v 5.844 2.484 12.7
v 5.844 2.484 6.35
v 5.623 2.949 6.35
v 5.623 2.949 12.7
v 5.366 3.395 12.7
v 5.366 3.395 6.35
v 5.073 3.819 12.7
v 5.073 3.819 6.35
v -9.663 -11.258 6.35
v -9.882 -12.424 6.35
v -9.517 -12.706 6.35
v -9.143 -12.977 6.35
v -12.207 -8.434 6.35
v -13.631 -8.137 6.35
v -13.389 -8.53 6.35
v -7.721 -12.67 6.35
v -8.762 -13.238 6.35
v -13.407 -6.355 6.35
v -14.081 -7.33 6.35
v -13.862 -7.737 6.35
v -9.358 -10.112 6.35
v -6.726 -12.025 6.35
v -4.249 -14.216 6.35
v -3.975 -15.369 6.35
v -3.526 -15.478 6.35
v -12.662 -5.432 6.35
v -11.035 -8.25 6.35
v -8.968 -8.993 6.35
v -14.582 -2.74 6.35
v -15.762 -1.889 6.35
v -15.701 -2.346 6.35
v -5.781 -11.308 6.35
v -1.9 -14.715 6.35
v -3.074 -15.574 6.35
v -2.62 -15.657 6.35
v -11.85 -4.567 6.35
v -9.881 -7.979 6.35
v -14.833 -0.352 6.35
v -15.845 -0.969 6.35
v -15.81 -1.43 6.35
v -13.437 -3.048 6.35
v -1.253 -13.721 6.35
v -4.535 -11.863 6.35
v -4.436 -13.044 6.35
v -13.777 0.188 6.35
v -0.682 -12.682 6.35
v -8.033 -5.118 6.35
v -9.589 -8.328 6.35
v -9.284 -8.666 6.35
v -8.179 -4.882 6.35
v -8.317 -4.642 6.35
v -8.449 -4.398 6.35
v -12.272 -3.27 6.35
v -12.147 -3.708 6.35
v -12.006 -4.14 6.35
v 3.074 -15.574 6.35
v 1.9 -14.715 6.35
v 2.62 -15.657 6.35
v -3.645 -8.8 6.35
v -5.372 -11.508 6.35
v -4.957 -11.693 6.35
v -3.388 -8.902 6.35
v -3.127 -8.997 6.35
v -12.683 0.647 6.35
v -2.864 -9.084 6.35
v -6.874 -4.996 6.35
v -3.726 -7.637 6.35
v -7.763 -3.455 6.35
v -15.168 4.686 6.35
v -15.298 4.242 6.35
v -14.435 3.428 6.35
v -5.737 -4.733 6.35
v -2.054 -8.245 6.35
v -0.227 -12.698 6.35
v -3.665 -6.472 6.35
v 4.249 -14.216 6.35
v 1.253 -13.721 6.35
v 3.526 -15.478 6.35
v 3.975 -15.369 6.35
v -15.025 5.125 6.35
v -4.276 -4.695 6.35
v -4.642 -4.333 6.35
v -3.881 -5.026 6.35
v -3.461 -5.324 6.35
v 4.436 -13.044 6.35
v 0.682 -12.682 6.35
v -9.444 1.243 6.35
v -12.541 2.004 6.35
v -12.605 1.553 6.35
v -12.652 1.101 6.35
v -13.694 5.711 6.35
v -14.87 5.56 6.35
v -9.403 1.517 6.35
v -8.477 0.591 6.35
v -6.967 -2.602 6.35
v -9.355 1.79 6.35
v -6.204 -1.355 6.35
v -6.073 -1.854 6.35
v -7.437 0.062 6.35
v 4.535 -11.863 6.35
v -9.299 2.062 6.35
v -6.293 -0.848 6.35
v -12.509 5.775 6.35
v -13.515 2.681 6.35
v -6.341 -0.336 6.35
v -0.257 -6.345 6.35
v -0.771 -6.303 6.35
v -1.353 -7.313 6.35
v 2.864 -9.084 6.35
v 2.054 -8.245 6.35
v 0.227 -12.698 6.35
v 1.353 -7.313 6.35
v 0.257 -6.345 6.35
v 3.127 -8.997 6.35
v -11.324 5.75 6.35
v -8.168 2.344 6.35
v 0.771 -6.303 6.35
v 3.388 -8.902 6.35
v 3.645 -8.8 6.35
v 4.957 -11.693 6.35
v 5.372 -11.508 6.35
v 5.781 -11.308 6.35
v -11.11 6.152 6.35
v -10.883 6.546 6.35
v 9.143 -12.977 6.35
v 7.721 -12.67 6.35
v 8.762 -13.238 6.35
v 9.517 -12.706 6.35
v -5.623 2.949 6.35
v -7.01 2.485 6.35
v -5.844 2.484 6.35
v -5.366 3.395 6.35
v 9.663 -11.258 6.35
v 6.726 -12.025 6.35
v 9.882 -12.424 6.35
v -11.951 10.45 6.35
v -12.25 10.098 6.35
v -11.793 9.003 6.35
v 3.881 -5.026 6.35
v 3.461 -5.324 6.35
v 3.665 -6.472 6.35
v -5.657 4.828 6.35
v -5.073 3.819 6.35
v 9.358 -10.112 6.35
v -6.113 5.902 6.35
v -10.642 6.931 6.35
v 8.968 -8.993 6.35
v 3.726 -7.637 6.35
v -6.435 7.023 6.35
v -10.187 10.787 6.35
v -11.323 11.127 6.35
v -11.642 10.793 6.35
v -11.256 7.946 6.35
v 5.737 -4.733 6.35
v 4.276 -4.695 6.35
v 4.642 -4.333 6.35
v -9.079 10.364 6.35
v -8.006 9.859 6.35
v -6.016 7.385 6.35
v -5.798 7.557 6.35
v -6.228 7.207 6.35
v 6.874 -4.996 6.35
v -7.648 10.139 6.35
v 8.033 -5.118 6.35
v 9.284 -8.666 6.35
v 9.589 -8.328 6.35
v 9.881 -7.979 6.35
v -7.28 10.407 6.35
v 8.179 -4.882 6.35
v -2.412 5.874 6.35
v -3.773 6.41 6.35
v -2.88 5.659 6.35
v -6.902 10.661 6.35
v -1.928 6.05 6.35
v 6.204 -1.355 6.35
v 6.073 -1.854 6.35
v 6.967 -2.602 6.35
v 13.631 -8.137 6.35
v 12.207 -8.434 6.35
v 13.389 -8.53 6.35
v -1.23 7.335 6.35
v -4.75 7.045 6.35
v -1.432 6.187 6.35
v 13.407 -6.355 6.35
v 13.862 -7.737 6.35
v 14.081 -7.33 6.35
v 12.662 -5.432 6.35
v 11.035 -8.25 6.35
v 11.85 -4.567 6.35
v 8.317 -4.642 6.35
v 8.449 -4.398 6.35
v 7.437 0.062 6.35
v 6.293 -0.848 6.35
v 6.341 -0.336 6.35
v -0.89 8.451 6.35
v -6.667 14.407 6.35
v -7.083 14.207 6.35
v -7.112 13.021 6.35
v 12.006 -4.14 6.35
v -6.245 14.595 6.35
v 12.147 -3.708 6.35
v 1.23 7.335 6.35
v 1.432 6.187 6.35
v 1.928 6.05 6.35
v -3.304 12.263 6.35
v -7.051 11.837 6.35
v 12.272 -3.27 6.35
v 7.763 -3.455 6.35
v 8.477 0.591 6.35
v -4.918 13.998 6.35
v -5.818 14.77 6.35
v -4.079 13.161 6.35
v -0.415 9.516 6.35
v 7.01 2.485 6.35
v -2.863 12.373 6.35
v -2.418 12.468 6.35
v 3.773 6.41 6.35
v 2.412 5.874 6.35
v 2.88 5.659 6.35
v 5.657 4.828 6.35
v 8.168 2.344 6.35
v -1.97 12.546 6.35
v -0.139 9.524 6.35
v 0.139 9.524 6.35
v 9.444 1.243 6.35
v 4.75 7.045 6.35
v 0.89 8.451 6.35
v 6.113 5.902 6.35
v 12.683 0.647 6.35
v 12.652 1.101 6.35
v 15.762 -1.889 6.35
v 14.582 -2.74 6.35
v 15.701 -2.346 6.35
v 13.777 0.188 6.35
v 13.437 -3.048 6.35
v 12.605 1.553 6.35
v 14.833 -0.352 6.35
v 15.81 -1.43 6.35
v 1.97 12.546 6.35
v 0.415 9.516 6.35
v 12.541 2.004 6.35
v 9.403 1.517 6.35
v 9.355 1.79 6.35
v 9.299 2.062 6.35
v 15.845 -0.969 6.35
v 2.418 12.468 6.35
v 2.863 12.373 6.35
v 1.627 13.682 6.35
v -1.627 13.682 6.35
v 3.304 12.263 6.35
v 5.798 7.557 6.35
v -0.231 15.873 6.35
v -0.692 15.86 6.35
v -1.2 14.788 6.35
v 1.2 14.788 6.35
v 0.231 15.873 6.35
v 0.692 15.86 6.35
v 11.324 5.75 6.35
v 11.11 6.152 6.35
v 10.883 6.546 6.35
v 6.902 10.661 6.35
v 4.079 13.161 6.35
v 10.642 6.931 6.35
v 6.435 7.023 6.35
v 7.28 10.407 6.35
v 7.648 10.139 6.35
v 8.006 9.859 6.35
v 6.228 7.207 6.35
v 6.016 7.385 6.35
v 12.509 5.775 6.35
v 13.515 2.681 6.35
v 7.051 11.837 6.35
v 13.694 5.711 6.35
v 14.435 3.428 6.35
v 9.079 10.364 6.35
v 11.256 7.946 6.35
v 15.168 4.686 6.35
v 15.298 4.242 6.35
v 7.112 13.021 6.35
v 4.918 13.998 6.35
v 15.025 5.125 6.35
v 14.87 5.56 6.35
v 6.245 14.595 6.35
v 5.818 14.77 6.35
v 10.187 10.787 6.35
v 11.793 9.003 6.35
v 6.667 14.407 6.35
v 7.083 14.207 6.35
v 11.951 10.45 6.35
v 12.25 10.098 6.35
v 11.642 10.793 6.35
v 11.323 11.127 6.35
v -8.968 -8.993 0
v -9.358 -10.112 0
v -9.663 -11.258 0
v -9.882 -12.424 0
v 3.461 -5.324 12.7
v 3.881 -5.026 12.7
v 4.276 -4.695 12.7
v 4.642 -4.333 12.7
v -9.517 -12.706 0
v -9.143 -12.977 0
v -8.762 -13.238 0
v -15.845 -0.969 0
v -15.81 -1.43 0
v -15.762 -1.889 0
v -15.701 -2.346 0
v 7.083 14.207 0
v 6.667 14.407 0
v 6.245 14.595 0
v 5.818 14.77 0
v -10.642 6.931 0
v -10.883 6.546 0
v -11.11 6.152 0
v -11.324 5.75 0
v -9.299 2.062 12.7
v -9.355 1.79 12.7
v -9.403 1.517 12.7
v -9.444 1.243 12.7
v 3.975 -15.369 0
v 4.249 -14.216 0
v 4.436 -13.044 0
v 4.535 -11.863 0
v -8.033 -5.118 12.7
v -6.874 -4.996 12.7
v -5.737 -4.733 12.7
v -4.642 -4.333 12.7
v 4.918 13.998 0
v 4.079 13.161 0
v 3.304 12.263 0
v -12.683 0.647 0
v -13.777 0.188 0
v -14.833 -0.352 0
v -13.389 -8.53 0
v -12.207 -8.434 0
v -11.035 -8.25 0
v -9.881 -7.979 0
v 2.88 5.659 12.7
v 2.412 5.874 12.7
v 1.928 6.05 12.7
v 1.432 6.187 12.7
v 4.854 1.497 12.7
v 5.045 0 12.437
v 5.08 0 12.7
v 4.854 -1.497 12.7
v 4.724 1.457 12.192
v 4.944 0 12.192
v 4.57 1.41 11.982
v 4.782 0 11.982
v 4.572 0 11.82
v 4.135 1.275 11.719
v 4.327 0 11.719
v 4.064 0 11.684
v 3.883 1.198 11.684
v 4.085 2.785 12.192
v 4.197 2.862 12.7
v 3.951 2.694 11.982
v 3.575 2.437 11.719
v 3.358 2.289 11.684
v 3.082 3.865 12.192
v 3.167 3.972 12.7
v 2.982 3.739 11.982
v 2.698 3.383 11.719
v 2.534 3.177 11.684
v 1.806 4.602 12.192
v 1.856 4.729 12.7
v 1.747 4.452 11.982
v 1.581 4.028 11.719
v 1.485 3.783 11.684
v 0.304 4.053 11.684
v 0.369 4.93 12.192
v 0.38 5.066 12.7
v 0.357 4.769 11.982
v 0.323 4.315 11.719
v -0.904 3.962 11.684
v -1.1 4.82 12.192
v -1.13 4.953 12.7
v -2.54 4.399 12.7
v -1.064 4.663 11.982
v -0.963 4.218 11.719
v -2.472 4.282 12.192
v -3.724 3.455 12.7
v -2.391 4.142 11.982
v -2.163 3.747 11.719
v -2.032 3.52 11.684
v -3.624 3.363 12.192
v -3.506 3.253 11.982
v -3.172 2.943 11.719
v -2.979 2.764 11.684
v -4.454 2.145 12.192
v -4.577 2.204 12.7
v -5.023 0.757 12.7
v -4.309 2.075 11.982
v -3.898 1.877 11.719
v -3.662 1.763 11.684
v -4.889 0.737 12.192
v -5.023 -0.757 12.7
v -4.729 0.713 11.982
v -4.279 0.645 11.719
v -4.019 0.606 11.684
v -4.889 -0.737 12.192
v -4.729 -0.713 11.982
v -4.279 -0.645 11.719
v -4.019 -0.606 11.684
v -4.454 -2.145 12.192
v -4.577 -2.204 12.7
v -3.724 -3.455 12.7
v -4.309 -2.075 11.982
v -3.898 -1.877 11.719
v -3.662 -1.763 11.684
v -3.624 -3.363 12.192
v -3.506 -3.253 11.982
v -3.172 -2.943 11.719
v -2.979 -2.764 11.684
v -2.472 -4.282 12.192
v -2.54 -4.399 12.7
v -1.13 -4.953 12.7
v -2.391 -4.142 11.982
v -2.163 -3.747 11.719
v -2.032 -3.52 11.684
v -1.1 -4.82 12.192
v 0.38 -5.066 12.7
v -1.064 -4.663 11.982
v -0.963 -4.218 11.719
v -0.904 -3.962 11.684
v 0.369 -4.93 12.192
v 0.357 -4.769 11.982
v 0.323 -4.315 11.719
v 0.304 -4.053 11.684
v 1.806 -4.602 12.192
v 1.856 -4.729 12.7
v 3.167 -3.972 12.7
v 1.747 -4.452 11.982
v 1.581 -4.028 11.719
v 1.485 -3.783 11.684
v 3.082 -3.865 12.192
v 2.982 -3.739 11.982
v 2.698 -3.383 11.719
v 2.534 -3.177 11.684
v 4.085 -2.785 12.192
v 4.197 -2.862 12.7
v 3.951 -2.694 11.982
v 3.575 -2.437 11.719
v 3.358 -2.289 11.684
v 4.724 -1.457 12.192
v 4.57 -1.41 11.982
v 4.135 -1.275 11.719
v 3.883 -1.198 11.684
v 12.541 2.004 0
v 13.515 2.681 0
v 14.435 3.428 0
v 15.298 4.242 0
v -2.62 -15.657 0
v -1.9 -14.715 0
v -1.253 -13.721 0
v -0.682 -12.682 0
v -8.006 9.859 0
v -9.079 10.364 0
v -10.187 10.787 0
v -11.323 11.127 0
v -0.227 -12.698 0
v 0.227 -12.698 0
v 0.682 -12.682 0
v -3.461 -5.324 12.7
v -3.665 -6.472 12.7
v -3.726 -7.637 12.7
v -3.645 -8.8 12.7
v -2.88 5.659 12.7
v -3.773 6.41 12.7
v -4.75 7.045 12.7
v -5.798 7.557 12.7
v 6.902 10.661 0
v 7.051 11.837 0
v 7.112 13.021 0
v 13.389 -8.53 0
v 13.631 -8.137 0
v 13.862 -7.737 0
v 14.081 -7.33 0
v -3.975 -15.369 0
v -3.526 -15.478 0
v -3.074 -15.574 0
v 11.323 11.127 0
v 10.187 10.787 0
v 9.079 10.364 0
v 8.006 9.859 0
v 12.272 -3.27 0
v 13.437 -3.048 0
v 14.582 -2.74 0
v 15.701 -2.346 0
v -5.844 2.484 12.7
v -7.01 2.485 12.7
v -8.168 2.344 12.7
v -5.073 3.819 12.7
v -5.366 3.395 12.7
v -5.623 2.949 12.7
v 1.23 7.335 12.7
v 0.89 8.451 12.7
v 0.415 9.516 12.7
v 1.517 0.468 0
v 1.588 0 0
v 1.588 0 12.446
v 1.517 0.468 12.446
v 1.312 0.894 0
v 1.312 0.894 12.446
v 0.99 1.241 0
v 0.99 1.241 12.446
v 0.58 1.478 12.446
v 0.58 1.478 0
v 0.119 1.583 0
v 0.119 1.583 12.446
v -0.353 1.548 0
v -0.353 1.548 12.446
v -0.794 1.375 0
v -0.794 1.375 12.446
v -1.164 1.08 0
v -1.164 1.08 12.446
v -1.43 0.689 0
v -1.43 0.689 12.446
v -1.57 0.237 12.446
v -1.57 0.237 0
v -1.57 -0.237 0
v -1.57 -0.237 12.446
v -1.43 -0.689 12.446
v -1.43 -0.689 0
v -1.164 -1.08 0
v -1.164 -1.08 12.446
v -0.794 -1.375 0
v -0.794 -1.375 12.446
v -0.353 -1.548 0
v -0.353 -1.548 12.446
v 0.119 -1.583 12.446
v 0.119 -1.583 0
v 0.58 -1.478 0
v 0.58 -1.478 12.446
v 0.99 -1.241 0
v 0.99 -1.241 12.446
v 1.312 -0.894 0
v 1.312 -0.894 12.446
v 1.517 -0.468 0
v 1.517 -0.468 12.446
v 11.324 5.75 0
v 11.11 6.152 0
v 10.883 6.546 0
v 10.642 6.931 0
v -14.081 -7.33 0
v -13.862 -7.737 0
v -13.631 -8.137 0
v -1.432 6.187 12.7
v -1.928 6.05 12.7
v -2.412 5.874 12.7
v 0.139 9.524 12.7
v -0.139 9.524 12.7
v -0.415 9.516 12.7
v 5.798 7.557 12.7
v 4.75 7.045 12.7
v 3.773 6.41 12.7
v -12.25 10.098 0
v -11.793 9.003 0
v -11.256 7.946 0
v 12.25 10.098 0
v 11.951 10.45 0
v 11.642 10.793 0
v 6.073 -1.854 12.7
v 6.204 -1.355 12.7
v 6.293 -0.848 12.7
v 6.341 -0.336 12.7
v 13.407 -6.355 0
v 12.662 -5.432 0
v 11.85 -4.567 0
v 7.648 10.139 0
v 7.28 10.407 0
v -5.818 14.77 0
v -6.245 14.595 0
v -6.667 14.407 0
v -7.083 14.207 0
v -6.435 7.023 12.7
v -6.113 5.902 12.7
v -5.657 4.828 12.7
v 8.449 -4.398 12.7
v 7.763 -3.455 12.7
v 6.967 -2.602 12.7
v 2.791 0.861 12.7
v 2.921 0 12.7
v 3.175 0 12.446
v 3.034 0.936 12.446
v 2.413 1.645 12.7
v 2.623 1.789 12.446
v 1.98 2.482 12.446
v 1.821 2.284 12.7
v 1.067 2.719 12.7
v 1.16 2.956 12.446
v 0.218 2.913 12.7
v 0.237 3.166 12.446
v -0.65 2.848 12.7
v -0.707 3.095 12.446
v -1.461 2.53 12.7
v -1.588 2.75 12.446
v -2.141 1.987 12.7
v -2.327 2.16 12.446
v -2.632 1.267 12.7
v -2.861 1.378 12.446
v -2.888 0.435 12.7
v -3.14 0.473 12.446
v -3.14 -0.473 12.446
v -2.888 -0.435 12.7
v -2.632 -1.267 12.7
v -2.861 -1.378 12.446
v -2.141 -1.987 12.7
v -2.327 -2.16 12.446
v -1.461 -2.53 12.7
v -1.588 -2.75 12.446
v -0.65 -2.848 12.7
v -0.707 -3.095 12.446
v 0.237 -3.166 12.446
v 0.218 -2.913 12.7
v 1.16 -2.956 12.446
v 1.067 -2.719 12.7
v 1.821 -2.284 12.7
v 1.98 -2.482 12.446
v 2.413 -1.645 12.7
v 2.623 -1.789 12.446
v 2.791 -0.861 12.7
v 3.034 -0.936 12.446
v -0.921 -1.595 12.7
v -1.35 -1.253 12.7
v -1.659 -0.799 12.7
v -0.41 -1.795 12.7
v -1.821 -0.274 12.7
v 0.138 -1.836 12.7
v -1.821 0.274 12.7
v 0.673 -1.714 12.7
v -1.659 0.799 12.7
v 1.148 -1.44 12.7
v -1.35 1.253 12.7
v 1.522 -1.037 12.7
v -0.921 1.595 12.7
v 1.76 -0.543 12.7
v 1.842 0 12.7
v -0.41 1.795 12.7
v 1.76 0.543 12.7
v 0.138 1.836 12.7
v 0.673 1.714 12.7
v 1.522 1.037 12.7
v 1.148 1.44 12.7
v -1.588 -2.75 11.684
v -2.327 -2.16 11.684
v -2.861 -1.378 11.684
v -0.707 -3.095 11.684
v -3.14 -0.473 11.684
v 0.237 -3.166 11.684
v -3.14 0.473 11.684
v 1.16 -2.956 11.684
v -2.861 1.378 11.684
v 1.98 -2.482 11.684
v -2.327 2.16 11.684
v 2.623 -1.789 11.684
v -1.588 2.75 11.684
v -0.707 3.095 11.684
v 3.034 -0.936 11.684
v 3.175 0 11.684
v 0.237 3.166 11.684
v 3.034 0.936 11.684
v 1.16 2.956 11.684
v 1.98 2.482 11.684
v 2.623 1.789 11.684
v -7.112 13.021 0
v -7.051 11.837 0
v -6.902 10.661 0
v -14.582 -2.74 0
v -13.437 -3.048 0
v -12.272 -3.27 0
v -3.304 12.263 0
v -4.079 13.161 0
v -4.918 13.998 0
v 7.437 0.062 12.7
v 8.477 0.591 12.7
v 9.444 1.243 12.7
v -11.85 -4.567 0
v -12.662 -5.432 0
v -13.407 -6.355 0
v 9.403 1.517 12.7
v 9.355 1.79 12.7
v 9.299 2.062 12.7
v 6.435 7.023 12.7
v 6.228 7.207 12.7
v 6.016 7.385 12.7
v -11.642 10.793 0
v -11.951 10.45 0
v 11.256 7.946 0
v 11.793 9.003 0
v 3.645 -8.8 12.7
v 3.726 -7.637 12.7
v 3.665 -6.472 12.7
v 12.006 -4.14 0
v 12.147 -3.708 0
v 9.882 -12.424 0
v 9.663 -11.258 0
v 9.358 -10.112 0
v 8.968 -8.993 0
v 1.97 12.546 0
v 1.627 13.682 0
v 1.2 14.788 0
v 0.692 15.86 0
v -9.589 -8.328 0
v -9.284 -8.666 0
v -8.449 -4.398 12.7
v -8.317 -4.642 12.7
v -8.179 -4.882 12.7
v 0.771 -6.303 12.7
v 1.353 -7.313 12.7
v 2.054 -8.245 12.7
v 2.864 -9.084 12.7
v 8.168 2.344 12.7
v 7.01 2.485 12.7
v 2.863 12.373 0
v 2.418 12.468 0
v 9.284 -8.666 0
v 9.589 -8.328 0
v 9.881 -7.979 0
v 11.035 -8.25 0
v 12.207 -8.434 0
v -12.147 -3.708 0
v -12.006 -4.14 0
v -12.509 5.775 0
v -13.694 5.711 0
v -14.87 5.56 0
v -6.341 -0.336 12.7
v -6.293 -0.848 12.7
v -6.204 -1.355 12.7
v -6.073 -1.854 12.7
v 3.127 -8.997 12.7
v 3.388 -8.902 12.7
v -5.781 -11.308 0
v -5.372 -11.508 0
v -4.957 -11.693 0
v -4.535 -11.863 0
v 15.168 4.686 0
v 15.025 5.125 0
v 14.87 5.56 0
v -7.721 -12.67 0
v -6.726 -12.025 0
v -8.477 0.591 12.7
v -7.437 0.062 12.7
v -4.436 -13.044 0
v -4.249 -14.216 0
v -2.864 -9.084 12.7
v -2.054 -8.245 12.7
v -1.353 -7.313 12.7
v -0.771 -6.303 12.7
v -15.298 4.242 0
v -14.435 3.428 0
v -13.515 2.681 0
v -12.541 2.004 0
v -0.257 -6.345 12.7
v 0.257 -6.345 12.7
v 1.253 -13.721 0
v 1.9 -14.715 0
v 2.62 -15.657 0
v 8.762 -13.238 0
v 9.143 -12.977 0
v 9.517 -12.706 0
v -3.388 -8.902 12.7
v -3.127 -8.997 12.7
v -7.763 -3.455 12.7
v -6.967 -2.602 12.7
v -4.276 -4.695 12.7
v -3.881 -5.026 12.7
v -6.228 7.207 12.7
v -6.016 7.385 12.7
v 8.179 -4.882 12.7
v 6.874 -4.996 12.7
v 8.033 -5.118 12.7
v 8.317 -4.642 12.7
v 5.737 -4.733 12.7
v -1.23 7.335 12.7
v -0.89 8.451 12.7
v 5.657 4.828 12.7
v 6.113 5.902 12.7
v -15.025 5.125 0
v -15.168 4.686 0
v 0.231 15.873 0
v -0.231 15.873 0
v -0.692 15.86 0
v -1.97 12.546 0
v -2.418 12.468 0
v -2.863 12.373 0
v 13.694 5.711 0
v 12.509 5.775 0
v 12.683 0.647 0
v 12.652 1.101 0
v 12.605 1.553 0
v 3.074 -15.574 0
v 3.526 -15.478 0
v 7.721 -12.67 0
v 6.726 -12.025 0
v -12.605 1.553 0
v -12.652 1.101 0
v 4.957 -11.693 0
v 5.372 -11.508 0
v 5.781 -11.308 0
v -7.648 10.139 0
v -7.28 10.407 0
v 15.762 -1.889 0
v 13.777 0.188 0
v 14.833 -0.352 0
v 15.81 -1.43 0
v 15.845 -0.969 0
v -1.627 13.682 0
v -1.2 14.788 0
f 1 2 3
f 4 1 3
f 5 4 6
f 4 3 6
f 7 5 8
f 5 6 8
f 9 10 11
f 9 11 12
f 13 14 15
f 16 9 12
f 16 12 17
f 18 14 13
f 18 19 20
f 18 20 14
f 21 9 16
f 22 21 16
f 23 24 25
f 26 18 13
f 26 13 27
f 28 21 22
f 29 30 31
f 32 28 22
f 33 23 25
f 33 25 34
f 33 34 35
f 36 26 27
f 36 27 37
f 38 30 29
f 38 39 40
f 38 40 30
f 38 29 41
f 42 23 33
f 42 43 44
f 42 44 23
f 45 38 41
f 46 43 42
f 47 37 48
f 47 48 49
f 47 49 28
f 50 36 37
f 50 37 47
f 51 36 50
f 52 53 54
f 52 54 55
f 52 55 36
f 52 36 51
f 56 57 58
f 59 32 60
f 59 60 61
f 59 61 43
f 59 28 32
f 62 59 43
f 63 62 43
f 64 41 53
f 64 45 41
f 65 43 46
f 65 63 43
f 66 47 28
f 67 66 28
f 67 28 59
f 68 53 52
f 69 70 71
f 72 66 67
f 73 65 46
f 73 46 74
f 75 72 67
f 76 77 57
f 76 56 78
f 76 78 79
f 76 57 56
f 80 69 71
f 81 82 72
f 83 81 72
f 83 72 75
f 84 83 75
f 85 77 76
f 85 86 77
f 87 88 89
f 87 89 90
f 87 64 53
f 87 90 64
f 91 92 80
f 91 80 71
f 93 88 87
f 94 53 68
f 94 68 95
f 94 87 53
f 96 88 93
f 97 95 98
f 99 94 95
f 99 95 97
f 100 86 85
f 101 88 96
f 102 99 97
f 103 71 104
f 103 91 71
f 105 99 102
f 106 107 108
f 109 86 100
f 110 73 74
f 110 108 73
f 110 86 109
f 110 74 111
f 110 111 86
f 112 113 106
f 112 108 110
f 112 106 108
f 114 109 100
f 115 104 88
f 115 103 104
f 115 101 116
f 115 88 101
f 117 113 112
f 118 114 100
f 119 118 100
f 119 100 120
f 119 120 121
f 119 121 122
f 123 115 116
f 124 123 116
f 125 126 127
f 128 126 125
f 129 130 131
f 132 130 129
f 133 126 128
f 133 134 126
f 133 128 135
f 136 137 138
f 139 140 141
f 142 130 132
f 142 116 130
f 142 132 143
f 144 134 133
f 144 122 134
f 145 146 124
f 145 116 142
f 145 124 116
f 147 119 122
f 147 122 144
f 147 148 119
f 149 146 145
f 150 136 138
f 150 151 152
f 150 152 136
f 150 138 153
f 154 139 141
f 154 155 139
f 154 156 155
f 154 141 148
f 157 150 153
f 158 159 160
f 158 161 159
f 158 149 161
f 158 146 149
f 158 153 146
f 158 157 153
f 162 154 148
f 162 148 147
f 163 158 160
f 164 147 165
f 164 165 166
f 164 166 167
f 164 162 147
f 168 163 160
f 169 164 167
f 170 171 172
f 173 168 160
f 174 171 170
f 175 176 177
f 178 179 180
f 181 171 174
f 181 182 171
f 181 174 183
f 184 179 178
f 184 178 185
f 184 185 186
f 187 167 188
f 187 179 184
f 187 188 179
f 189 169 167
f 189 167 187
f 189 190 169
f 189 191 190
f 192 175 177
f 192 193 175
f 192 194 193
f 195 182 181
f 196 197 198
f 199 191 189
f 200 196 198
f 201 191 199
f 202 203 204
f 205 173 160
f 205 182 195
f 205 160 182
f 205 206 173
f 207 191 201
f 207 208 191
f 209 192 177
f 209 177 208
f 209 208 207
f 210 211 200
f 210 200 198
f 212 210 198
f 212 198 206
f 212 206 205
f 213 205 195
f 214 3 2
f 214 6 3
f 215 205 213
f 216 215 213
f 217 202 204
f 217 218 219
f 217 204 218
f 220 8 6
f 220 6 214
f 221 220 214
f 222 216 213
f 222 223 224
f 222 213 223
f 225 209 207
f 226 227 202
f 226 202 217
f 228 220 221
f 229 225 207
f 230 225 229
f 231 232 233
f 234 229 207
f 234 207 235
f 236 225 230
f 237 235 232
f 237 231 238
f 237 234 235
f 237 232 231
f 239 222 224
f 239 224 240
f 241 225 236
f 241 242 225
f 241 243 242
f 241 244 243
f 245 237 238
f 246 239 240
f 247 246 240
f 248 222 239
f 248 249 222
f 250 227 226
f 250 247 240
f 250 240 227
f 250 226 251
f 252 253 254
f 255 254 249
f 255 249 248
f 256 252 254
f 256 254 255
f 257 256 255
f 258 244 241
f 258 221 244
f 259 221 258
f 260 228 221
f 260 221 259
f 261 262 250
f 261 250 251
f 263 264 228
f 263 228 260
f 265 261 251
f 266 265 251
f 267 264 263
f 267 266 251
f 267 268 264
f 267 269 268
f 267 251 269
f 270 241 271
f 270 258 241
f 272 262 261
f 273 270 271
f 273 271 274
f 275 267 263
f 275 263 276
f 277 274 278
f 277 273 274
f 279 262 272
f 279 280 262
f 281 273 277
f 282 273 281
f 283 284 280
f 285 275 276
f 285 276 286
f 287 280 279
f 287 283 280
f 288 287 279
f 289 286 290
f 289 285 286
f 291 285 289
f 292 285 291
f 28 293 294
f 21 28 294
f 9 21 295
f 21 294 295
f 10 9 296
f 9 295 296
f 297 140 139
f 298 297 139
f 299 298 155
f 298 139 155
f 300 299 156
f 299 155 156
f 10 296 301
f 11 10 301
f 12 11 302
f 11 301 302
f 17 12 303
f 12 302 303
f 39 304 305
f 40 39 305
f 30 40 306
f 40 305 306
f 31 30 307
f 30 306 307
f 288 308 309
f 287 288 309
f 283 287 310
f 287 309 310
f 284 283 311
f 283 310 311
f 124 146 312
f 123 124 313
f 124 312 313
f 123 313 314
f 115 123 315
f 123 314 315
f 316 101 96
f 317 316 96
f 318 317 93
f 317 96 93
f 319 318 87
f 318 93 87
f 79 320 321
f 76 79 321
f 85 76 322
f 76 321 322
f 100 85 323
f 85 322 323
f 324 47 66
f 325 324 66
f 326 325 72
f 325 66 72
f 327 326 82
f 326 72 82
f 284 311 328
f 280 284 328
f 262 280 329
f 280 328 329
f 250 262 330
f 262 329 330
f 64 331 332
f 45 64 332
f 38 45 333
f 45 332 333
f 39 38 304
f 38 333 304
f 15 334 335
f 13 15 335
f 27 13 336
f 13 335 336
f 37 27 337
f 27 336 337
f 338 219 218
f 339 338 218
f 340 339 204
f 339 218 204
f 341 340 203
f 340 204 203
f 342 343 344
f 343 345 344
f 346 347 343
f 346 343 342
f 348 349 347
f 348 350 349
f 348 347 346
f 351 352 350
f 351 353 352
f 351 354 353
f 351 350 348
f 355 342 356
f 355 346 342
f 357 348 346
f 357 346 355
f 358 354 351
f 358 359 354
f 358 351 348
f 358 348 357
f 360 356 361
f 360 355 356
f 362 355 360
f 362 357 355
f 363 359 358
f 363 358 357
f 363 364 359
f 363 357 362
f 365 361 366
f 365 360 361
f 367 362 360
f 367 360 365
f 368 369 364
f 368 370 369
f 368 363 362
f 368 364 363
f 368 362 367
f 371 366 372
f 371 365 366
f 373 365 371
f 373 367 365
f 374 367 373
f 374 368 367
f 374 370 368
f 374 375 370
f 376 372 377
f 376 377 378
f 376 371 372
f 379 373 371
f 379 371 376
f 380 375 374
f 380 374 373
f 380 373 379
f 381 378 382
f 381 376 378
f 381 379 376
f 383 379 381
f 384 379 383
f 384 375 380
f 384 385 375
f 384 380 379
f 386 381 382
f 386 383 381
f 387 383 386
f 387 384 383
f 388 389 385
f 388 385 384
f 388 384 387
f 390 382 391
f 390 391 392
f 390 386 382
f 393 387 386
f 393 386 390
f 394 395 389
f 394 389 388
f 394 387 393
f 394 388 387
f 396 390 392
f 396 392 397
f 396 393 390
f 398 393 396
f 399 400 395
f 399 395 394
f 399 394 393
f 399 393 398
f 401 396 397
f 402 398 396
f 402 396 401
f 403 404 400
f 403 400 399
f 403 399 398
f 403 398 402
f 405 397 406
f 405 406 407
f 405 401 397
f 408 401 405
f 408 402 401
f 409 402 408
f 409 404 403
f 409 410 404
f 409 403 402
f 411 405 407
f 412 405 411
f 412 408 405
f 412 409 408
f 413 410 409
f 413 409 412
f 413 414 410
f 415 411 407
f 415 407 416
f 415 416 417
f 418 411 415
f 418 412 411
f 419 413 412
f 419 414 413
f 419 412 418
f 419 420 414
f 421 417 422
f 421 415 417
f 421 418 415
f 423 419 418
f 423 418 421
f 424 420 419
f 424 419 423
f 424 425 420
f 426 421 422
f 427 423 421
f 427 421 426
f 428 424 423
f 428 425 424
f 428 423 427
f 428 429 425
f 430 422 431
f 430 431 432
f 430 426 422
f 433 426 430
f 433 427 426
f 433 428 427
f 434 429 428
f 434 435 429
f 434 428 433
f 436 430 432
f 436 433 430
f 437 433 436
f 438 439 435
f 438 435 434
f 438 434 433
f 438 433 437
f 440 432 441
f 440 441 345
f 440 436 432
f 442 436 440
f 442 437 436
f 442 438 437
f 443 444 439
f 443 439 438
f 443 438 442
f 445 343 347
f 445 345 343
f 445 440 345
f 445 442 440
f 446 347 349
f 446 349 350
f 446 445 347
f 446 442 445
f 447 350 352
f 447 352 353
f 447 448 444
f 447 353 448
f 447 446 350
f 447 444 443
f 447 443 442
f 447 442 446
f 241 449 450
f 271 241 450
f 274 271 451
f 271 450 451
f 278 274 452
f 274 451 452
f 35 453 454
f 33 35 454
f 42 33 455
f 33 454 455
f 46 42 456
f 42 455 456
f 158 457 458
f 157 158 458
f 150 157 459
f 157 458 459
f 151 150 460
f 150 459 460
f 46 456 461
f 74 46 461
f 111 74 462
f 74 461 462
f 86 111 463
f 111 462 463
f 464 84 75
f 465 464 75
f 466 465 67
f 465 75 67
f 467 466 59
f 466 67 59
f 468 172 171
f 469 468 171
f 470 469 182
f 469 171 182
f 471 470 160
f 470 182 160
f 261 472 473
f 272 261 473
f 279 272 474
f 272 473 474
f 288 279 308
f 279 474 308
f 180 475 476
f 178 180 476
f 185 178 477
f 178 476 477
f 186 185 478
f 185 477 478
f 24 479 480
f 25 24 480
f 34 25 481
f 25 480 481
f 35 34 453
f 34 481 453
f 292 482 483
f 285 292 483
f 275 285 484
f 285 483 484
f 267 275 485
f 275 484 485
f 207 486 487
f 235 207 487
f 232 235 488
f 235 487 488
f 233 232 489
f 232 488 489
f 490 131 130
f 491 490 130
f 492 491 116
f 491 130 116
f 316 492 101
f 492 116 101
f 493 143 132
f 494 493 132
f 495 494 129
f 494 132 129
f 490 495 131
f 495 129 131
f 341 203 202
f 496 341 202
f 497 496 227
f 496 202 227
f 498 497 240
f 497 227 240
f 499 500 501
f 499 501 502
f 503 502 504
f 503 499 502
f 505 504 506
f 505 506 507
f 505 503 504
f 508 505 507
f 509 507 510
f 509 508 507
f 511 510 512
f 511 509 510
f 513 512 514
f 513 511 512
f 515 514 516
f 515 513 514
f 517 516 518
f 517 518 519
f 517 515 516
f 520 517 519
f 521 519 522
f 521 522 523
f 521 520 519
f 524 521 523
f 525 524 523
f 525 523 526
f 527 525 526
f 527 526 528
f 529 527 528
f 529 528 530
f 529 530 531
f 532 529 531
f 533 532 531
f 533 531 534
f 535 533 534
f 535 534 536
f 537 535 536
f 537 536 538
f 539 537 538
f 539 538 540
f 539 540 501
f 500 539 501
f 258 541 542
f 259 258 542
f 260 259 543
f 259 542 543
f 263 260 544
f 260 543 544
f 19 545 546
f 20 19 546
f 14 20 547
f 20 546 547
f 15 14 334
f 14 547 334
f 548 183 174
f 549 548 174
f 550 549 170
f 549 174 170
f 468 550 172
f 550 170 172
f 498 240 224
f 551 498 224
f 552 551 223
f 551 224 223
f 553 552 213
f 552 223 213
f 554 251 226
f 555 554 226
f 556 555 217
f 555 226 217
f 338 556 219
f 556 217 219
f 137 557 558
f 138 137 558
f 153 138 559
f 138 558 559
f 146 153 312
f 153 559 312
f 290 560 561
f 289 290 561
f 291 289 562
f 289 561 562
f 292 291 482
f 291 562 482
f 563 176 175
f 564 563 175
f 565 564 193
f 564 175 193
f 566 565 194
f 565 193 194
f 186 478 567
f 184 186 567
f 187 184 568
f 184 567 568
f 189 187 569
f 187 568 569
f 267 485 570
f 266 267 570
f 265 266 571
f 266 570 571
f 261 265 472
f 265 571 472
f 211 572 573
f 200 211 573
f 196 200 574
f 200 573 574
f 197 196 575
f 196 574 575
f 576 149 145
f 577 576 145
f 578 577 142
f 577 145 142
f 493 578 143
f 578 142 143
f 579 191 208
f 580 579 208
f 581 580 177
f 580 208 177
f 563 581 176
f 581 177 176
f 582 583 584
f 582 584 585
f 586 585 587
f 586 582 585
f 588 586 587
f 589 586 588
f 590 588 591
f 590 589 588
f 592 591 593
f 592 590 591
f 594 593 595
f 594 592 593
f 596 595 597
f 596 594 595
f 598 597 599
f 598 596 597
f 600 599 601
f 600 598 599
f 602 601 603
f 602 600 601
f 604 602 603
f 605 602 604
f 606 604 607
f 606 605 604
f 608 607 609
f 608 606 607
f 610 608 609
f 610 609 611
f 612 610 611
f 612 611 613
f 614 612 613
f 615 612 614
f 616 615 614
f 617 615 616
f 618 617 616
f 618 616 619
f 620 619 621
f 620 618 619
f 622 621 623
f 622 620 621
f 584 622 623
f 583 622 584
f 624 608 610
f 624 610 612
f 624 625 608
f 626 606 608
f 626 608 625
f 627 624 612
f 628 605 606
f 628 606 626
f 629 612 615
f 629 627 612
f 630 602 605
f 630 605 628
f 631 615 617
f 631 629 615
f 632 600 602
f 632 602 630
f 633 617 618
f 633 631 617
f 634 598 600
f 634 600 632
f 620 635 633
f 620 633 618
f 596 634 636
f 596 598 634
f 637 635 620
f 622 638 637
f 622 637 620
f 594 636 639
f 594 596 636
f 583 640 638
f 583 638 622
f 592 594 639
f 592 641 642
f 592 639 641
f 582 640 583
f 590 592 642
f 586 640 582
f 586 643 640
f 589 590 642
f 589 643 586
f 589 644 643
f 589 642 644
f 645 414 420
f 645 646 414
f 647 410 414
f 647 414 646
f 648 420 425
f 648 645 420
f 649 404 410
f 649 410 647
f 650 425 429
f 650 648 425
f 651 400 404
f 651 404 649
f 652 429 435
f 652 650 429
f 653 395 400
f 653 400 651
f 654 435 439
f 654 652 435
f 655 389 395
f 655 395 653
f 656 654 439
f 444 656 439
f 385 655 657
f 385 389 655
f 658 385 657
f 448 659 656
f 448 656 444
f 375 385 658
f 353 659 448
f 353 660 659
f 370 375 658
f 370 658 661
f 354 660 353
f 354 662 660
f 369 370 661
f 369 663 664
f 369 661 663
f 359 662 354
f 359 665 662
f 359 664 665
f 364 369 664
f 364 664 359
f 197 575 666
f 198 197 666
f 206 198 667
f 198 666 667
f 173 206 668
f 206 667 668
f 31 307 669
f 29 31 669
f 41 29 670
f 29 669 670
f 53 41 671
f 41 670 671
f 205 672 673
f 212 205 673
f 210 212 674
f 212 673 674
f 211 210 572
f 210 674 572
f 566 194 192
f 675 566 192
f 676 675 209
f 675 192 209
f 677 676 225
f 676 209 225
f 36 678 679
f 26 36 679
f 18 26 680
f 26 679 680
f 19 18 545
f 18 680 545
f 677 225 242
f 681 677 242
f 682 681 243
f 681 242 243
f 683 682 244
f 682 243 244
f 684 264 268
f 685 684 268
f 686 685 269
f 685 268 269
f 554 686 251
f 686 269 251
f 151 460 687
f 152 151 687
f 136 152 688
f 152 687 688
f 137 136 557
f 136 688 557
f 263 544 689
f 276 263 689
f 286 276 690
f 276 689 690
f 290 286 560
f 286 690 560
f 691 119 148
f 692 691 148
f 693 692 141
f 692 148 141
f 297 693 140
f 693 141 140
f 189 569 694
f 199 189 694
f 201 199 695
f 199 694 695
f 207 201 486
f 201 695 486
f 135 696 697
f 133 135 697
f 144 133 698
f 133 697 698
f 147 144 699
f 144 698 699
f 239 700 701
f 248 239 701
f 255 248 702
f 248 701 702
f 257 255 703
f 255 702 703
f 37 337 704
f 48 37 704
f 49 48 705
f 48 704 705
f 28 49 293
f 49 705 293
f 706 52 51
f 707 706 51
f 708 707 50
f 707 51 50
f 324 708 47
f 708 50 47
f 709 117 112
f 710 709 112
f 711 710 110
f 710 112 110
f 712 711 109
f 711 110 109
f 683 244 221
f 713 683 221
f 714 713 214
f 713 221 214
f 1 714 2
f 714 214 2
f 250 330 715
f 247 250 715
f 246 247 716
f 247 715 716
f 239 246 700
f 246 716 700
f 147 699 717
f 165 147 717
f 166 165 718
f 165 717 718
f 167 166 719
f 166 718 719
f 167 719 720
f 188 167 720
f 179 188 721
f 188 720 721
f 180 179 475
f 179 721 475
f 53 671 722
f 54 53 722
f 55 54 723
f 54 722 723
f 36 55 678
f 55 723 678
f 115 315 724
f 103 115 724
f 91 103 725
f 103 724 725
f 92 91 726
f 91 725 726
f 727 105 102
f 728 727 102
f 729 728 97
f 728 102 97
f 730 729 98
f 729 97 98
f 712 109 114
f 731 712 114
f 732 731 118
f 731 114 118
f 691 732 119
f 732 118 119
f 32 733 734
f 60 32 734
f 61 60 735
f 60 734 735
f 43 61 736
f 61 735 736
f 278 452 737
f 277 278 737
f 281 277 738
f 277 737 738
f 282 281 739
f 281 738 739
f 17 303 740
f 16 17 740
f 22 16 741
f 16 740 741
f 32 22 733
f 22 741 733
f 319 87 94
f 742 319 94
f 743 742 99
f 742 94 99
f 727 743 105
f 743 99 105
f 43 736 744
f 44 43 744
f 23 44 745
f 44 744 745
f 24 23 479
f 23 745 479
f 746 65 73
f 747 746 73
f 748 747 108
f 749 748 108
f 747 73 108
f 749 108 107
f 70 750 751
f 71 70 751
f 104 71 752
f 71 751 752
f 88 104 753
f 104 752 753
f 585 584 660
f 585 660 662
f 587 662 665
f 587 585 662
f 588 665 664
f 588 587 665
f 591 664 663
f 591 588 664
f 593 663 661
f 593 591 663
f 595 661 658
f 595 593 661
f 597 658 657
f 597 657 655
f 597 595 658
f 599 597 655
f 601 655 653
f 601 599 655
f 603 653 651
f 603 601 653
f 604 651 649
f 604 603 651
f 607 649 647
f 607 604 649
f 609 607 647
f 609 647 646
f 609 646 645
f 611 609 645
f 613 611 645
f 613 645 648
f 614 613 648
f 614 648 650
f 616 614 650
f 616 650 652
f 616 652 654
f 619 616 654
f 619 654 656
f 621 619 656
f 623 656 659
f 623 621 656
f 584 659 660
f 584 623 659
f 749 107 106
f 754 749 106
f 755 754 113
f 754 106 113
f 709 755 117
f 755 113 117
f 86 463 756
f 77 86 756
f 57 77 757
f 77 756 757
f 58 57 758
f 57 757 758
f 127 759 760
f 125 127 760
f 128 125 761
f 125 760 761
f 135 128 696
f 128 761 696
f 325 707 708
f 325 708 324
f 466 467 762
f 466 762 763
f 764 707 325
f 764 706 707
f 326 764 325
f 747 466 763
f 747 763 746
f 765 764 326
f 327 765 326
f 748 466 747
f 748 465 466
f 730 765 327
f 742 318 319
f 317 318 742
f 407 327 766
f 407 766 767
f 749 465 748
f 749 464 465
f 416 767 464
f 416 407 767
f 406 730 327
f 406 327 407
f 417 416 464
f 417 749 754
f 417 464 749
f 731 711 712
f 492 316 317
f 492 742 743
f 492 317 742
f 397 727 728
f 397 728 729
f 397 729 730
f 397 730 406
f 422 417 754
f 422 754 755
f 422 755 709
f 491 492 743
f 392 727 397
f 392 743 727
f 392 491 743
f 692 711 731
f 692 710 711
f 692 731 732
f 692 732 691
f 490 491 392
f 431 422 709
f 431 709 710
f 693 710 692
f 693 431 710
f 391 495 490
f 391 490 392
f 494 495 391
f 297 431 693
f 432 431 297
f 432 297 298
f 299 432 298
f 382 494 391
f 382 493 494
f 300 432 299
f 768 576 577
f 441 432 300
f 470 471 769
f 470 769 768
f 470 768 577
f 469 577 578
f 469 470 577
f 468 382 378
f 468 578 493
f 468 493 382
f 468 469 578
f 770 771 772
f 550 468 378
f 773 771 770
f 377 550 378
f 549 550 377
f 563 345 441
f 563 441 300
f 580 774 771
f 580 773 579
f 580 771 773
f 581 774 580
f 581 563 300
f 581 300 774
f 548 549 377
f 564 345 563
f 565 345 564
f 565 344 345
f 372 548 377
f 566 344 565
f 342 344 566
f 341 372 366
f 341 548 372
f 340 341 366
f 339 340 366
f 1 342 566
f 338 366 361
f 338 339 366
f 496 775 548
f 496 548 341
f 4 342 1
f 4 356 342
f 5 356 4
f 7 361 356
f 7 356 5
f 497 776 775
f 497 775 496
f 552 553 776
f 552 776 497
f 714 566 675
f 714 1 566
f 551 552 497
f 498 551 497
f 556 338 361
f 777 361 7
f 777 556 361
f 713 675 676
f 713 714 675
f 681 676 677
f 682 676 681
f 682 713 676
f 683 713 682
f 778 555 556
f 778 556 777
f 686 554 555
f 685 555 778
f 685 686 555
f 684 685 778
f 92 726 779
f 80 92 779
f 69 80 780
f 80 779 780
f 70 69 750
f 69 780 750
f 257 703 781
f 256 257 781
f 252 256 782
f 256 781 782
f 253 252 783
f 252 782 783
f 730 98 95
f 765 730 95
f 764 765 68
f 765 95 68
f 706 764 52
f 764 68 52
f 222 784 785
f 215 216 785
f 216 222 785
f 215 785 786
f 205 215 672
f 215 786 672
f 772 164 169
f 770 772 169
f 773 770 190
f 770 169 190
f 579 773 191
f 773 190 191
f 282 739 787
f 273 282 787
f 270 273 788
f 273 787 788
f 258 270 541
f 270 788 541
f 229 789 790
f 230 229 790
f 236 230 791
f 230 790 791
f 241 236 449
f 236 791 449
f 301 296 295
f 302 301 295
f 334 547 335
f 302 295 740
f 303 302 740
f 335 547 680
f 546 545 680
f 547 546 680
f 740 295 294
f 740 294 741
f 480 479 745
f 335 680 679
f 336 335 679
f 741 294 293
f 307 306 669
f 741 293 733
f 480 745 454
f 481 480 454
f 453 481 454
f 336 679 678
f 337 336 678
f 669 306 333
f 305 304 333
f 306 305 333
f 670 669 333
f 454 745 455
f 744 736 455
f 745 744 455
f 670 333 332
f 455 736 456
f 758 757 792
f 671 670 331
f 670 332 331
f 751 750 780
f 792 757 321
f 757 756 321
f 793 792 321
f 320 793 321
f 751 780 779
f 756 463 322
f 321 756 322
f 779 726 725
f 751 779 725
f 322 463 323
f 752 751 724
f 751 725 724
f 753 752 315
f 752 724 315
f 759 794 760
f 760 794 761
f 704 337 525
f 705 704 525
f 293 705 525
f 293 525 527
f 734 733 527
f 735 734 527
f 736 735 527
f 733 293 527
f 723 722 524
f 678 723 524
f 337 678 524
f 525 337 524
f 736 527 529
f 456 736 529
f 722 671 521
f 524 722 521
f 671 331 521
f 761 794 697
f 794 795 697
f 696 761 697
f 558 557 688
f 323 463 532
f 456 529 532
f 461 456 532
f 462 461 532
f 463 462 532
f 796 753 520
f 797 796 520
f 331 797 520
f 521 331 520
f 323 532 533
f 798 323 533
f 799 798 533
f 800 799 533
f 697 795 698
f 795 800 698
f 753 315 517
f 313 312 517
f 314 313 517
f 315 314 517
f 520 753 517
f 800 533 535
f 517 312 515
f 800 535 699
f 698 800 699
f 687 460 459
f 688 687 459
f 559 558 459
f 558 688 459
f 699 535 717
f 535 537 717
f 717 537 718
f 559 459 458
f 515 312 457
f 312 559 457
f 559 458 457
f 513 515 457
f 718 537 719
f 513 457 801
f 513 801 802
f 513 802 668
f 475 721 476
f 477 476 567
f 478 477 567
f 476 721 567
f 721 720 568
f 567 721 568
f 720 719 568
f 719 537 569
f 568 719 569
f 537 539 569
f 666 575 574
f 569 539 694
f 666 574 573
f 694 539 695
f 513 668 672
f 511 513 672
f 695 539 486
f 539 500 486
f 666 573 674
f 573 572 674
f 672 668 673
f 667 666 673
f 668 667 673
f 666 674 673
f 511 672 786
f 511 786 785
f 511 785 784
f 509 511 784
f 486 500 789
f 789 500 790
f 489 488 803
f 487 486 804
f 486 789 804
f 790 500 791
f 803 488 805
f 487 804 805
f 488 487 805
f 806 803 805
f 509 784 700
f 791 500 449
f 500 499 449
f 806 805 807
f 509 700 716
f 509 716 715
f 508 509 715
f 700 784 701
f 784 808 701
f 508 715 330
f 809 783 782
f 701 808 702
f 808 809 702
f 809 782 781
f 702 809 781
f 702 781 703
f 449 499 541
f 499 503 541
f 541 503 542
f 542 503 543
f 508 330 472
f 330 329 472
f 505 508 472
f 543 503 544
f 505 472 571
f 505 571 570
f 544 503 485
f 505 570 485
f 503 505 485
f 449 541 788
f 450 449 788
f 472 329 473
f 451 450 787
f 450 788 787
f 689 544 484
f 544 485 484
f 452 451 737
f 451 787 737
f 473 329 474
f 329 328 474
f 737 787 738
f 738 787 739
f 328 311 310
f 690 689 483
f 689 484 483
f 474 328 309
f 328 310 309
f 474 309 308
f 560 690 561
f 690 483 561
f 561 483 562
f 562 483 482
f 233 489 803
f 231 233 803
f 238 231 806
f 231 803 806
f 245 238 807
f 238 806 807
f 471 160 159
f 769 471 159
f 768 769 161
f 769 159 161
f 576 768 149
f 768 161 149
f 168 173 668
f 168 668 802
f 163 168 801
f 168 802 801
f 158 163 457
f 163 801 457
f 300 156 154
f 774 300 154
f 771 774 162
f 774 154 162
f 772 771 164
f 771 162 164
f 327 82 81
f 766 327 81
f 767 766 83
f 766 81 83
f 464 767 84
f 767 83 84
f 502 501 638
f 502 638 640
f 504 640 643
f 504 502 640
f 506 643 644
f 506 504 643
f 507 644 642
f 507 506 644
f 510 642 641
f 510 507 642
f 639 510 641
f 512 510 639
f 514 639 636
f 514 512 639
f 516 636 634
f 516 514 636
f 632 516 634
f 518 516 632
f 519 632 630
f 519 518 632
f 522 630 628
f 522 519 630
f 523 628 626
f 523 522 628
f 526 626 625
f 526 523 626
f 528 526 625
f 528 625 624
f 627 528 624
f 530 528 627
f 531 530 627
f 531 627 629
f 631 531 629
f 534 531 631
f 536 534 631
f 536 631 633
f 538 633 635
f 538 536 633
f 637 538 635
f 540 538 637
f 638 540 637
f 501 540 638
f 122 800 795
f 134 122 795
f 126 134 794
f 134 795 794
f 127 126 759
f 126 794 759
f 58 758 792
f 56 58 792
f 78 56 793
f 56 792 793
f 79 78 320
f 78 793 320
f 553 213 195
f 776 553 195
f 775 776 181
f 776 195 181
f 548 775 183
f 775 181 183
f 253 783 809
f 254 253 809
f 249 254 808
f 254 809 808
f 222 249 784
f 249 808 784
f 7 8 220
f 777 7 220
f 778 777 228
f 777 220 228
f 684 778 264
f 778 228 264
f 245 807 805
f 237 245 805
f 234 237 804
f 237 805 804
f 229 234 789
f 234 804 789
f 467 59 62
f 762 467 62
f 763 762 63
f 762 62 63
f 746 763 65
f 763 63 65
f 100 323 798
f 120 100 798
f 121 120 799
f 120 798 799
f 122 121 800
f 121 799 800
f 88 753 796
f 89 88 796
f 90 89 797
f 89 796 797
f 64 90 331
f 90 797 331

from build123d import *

# Parameters (mm, degrees)
F0_R     = 4.7625
F0_R_2   = 1.5875
F1_DEPTH = 6.35
F2_COUNT = 15
F3_R     = 4.7625
F3_R_2   = 3.175
F3_R_3   = 1.5875
F4_DEPTH = 6.35
F5_R     = 5.08
F5_R_2   = 3.175
F6_DEPTH = 1.016
F7_R     = 1.01599
F8_SIZE  = 0.254


# Not quite as in the source:
# - a fillet or chamfer is up to 0.001 mm smaller than in the source, because OpenCascade refuses the exact size


with BuildPart() as f1:
    # F0 (on Top) → F1 (new body)
    with BuildSketch(Plane.XY):
        with BuildLine():
            ThreePointArc((-1.9696004156, 12.5463410683), (-8.2545767524, -9.6515264409), (12.7, 0))
            ThreePointArc((12.7, 0), (9.6515264409, 8.2545767524), (1.9696004156, 12.5463410683))
            ThreePointArc((1.9696004156, 12.5463410683), (0, 12.7), (-1.9696004156, 12.5463410683))
        make_face()
        Circle(F0_R, mode=Mode.SUBTRACT)
        with BuildLine():
            ThreePointArc((-1.9696004156, 12.5463410683), (0, 12.7), (1.9696004156, 12.5463410683))
            ThreePointArc((1.9696004156, 12.5463410683), (1.4239736696, 14.2389394562), (0.6924577744, 15.8598905176))
            ThreePointArc((0.6924577744, 15.8598905176), (0, 15.875), (-0.6924577744, 15.8598905176))
            ThreePointArc((-0.6924577744, 15.8598905176), (-1.4239736696, 14.2389394562), (-1.9696004156, 12.5463410683))
        make_face()
        Circle(F0_R)
        Circle(F0_R_2, mode=Mode.SUBTRACT)
    extrude(amount=F1_DEPTH)

    # F2: F1 ×15 about axis
    f2_axis = Axis((0, 0, 0), (0, 0, -1))


with BuildPart() as f1_1:
    add(f1.part)
    for i in range(1, F2_COUNT):
        add(f1.part.rotate(f2_axis, i * 360 / F2_COUNT))

    # F3 (on face) → F4 (join)
    with BuildSketch(Plane.XY.offset(6.35)):
        with BuildLine():
            ThreePointArc((6.3411298165, -0.3355184801), (6.3477820668, -0.1678178556), (6.35, 0))
            ThreePointArc((6.35, 0), (6.222203729, 1.2675491134), (5.8439588173, 2.4840783686))
            ThreePointArc((5.8439588173, 2.4840783686), (5.499261314, 3.175), (5.0732543809, 3.8189776102))
            ThreePointArc((5.0732543809, 3.8189776102), (4.0817013215, 4.8643822138), (2.879997381, 5.6593387498))
            ThreePointArc((2.879997381, 5.6593387498), (2.1718279101, 5.967048142), (1.4315468375, 6.1865316335))
            ThreePointArc((1.4315468375, 6.1865316335), (0, 6.35), (-1.4315468375, 6.1865316335))
            ThreePointArc((-1.4315468375, 6.1865316335), (-2.1718279101, 5.967048142), (-2.879997381, 5.6593387498))
            ThreePointArc((-2.879997381, 5.6593387498), (-4.0817013215, 4.8643822138), (-5.0732543809, 3.8189776102))
            ThreePointArc((-5.0732543809, 3.8189776102), (-5.499261314, 3.175), (-5.8439588173, 2.4840783686))
            ThreePointArc((-5.8439588173, 2.4840783686), (-6.2535292316, 1.1026659282), (-6.3411298165, -0.3355184801))
            ThreePointArc((-6.3411298165, -0.3355184801), (-6.2535292316, -1.1026659282), (-6.0734669747, -1.8535098888))
            ThreePointArc((-6.0734669747, -1.8535098888), (-5.499261314, -3.175), (-4.6419201372, -4.3330217447))
            ThreePointArc((-4.6419201372, -4.3330217447), (-4.0817013215, -4.8643822138), (-3.4611324355, -5.3238202697))
            ThreePointArc((-3.4611324355, -5.3238202697), (-2.1718279101, -5.967048142), (-0.7707044365, -6.3030559788))
            ThreePointArc((-0.7707044365, -6.3030559788), (0, -6.35), (0.7707044365, -6.3030559788))
            ThreePointArc((0.7707044365, -6.3030559788), (2.1718279101, -5.967048142), (3.4611324355, -5.3238202697))
            ThreePointArc((3.4611324355, -5.3238202697), (4.0817013215, -4.8643822138), (4.6419201372, -4.3330217447))
            ThreePointArc((4.6419201372, -4.3330217447), (5.499261314, -3.175), (6.0734669747, -1.8535098888))
            ThreePointArc((6.0734669747, -1.8535098888), (6.2535292316, -1.1026659282), (6.3411298165, -0.3355184801))
        make_face()
        Circle(F3_R, mode=Mode.SUBTRACT)
        with BuildLine():
            ThreePointArc((5.8439588173, 2.4840783686), (6.222203729, 1.2675491134), (6.35, 0))
            ThreePointArc((6.35, 0), (6.3477820668, -0.1678178556), (6.3411298165, -0.3355184801))
            ThreePointArc((6.3411298165, -0.3355184801), (7.9650557648, 0.3109444224), (9.4435123046, 1.2432619809))
            ThreePointArc((9.4435123046, 1.2432619809), (9.3802938474, 1.6539988923), (9.2992194678, 2.0615873228))
            ThreePointArc((9.2992194678, 2.0615873228), (7.5910533822, 2.4320173351), (5.8439588173, 2.4840783686))
        make_face()
        with BuildLine():
            ThreePointArc((2.879997381, 5.6593387498), (4.0817013215, 4.8643822138), (5.0732543809, 3.8189776102))
            ThreePointArc((5.0732543809, 3.8189776102), (5.9017154857, 5.358036403), (6.4349967275, 7.0225666331))
            ThreePointArc((6.4349967275, 7.0225666331), (6.1225519823, 7.2965733207), (5.7984526113, 7.5566905663))
            ThreePointArc((5.7984526113, 7.5566905663), (4.2518136514, 6.7424684237), (2.879997381, 5.6593387498))
        make_face()
        with BuildLine():
            ThreePointArc((8.448778186, -4.3981555411), (7.3783548704, -3.0164016935), (6.0734669747, -1.8535098888))
            ThreePointArc((6.0734669747, -1.8535098888), (5.499261314, -3.175), (4.6419201372, -4.3330217447))
            ThreePointArc((4.6419201372, -4.3330217447), (6.3014579298, -4.8816419092), (8.0333035214, -5.1177787695))
            ThreePointArc((8.0333035214, -5.1177787695), (8.248891971, -4.7625), (8.448778186, -4.3981555411))
        make_face()
        with BuildLine():
            ThreePointArc((-1.4315468375, 6.1865316335), (0, 6.35), (1.4315468375, 6.1865316335))
            ThreePointArc((1.4315468375, 6.1865316335), (1.0768969406, 7.8980436026), (0.4154746647, 9.5159343106))
            ThreePointArc((0.4154746647, 9.5159343106), (0, 9.525), (-0.4154746647, 9.5159343106))
            ThreePointArc((-0.4154746647, 9.5159343106), (-1.0768969406, 7.8980436026), (-1.4315468375, 6.1865316335))
        make_face()
        with BuildLine():
            ThreePointArc((3.6450596933, -8.7999525472), (3.7132421134, -7.0534128461), (3.4611324355, -5.3238202697))
            ThreePointArc((3.4611324355, -5.3238202697), (2.1718279101, -5.967048142), (0.7707044365, -6.3030559788))
            ThreePointArc((0.7707044365, -6.3030559788), (1.6893378965, -7.790053738), (2.8642227403, -9.0841539559))
            ThreePointArc((2.8642227403, -9.0841539559), (3.2577418652, -8.950572213), (3.6450596933, -8.7999525472))
        make_face()
        with BuildLine():
            ThreePointArc((-5.0732543809, 3.8189776102), (-4.0817013215, 4.8643822138), (-2.879997381, 5.6593387498))
            ThreePointArc((-2.879997381, 5.6593387498), (-4.2518136514, 6.7424684237), (-5.7984526113, 7.5566905663))
            ThreePointArc((-5.7984526113, 7.5566905663), (-6.1225519823, 7.2965733207), (-6.4349967275, 7.0225666331))
            ThreePointArc((-6.4349967275, 7.0225666331), (-5.9017154857, 5.358036403), (-5.0732543809, 3.8189776102))
        make_face()
        with BuildLine():
            ThreePointArc((-2.8642227403, -9.0841539559), (-1.6893378965, -7.790053738), (-0.7707044365, -6.3030559788))
            ThreePointArc((-0.7707044365, -6.3030559788), (-2.1718279101, -5.967048142), (-3.4611324355, -5.3238202697))
            ThreePointArc((-3.4611324355, -5.3238202697), (-3.7132421134, -7.0534128461), (-3.6450596933, -8.7999525472))
            ThreePointArc((-3.6450596933, -8.7999525472), (-3.2577418652, -8.950572213), (-2.8642227403, -9.0841539559))
        make_face()
        with BuildLine():
            ThreePointArc((-6.3411298165, -0.3355184801), (-6.2535292316, 1.1026659282), (-5.8439588173, 2.4840783686))
            ThreePointArc((-5.8439588173, 2.4840783686), (-7.5910533822, 2.4320173351), (-9.2992194678, 2.0615873228))
            ThreePointArc((-9.2992194678, 2.0615873228), (-9.3802938474, 1.6539988923), (-9.4435123046, 1.2432619809))
            ThreePointArc((-9.4435123046, 1.2432619809), (-7.9650557648, 0.3109444224), (-6.3411298165, -0.3355184801))
        make_face()
        with BuildLine():
            ThreePointArc((-8.0333035214, -5.1177787695), (-6.3014579298, -4.8816419092), (-4.6419201372, -4.3330217447))
            ThreePointArc((-4.6419201372, -4.3330217447), (-5.499261314, -3.175), (-6.0734669747, -1.8535098888))
            ThreePointArc((-6.0734669747, -1.8535098888), (-7.3783548704, -3.0164016935), (-8.448778186, -4.3981555411))
            ThreePointArc((-8.448778186, -4.3981555411), (-8.248891971, -4.7625), (-8.0333035214, -5.1177787695))
        make_face()
        Circle(F3_R)
        Circle(F3_R_2, mode=Mode.SUBTRACT)
        Circle(F3_R_2)
        Circle(F3_R_3, mode=Mode.SUBTRACT)
    extrude(amount=F4_DEPTH)

    # F5 (on face) → F6 (cut)
    with BuildSketch(Plane.XY.offset(12.7)):
        Circle(F5_R)
        Circle(F5_R_2, mode=Mode.SUBTRACT)
    extrude(amount=-F6_DEPTH, mode=Mode.SUBTRACT)

    # F7 (radius 1.016 in the source; OpenCascade refuses exactly that, so slightly less here)
    f7_edges = [f1_1.edges().sort_by_distance(p)[0] for p in [
        (-5.08, 0, 11.684),
    ]]
    fillet(f7_edges, radius=F7_R)

    # F8
    f8_edges = [f1_1.edges().sort_by_distance(p)[0] for p in [
        (-1.5875, 0, 12.7),
        (-3.175, 0, 12.7),
    ]]
    chamfer(f8_edges, length=F8_SIZE)


solid = f1_1.part
